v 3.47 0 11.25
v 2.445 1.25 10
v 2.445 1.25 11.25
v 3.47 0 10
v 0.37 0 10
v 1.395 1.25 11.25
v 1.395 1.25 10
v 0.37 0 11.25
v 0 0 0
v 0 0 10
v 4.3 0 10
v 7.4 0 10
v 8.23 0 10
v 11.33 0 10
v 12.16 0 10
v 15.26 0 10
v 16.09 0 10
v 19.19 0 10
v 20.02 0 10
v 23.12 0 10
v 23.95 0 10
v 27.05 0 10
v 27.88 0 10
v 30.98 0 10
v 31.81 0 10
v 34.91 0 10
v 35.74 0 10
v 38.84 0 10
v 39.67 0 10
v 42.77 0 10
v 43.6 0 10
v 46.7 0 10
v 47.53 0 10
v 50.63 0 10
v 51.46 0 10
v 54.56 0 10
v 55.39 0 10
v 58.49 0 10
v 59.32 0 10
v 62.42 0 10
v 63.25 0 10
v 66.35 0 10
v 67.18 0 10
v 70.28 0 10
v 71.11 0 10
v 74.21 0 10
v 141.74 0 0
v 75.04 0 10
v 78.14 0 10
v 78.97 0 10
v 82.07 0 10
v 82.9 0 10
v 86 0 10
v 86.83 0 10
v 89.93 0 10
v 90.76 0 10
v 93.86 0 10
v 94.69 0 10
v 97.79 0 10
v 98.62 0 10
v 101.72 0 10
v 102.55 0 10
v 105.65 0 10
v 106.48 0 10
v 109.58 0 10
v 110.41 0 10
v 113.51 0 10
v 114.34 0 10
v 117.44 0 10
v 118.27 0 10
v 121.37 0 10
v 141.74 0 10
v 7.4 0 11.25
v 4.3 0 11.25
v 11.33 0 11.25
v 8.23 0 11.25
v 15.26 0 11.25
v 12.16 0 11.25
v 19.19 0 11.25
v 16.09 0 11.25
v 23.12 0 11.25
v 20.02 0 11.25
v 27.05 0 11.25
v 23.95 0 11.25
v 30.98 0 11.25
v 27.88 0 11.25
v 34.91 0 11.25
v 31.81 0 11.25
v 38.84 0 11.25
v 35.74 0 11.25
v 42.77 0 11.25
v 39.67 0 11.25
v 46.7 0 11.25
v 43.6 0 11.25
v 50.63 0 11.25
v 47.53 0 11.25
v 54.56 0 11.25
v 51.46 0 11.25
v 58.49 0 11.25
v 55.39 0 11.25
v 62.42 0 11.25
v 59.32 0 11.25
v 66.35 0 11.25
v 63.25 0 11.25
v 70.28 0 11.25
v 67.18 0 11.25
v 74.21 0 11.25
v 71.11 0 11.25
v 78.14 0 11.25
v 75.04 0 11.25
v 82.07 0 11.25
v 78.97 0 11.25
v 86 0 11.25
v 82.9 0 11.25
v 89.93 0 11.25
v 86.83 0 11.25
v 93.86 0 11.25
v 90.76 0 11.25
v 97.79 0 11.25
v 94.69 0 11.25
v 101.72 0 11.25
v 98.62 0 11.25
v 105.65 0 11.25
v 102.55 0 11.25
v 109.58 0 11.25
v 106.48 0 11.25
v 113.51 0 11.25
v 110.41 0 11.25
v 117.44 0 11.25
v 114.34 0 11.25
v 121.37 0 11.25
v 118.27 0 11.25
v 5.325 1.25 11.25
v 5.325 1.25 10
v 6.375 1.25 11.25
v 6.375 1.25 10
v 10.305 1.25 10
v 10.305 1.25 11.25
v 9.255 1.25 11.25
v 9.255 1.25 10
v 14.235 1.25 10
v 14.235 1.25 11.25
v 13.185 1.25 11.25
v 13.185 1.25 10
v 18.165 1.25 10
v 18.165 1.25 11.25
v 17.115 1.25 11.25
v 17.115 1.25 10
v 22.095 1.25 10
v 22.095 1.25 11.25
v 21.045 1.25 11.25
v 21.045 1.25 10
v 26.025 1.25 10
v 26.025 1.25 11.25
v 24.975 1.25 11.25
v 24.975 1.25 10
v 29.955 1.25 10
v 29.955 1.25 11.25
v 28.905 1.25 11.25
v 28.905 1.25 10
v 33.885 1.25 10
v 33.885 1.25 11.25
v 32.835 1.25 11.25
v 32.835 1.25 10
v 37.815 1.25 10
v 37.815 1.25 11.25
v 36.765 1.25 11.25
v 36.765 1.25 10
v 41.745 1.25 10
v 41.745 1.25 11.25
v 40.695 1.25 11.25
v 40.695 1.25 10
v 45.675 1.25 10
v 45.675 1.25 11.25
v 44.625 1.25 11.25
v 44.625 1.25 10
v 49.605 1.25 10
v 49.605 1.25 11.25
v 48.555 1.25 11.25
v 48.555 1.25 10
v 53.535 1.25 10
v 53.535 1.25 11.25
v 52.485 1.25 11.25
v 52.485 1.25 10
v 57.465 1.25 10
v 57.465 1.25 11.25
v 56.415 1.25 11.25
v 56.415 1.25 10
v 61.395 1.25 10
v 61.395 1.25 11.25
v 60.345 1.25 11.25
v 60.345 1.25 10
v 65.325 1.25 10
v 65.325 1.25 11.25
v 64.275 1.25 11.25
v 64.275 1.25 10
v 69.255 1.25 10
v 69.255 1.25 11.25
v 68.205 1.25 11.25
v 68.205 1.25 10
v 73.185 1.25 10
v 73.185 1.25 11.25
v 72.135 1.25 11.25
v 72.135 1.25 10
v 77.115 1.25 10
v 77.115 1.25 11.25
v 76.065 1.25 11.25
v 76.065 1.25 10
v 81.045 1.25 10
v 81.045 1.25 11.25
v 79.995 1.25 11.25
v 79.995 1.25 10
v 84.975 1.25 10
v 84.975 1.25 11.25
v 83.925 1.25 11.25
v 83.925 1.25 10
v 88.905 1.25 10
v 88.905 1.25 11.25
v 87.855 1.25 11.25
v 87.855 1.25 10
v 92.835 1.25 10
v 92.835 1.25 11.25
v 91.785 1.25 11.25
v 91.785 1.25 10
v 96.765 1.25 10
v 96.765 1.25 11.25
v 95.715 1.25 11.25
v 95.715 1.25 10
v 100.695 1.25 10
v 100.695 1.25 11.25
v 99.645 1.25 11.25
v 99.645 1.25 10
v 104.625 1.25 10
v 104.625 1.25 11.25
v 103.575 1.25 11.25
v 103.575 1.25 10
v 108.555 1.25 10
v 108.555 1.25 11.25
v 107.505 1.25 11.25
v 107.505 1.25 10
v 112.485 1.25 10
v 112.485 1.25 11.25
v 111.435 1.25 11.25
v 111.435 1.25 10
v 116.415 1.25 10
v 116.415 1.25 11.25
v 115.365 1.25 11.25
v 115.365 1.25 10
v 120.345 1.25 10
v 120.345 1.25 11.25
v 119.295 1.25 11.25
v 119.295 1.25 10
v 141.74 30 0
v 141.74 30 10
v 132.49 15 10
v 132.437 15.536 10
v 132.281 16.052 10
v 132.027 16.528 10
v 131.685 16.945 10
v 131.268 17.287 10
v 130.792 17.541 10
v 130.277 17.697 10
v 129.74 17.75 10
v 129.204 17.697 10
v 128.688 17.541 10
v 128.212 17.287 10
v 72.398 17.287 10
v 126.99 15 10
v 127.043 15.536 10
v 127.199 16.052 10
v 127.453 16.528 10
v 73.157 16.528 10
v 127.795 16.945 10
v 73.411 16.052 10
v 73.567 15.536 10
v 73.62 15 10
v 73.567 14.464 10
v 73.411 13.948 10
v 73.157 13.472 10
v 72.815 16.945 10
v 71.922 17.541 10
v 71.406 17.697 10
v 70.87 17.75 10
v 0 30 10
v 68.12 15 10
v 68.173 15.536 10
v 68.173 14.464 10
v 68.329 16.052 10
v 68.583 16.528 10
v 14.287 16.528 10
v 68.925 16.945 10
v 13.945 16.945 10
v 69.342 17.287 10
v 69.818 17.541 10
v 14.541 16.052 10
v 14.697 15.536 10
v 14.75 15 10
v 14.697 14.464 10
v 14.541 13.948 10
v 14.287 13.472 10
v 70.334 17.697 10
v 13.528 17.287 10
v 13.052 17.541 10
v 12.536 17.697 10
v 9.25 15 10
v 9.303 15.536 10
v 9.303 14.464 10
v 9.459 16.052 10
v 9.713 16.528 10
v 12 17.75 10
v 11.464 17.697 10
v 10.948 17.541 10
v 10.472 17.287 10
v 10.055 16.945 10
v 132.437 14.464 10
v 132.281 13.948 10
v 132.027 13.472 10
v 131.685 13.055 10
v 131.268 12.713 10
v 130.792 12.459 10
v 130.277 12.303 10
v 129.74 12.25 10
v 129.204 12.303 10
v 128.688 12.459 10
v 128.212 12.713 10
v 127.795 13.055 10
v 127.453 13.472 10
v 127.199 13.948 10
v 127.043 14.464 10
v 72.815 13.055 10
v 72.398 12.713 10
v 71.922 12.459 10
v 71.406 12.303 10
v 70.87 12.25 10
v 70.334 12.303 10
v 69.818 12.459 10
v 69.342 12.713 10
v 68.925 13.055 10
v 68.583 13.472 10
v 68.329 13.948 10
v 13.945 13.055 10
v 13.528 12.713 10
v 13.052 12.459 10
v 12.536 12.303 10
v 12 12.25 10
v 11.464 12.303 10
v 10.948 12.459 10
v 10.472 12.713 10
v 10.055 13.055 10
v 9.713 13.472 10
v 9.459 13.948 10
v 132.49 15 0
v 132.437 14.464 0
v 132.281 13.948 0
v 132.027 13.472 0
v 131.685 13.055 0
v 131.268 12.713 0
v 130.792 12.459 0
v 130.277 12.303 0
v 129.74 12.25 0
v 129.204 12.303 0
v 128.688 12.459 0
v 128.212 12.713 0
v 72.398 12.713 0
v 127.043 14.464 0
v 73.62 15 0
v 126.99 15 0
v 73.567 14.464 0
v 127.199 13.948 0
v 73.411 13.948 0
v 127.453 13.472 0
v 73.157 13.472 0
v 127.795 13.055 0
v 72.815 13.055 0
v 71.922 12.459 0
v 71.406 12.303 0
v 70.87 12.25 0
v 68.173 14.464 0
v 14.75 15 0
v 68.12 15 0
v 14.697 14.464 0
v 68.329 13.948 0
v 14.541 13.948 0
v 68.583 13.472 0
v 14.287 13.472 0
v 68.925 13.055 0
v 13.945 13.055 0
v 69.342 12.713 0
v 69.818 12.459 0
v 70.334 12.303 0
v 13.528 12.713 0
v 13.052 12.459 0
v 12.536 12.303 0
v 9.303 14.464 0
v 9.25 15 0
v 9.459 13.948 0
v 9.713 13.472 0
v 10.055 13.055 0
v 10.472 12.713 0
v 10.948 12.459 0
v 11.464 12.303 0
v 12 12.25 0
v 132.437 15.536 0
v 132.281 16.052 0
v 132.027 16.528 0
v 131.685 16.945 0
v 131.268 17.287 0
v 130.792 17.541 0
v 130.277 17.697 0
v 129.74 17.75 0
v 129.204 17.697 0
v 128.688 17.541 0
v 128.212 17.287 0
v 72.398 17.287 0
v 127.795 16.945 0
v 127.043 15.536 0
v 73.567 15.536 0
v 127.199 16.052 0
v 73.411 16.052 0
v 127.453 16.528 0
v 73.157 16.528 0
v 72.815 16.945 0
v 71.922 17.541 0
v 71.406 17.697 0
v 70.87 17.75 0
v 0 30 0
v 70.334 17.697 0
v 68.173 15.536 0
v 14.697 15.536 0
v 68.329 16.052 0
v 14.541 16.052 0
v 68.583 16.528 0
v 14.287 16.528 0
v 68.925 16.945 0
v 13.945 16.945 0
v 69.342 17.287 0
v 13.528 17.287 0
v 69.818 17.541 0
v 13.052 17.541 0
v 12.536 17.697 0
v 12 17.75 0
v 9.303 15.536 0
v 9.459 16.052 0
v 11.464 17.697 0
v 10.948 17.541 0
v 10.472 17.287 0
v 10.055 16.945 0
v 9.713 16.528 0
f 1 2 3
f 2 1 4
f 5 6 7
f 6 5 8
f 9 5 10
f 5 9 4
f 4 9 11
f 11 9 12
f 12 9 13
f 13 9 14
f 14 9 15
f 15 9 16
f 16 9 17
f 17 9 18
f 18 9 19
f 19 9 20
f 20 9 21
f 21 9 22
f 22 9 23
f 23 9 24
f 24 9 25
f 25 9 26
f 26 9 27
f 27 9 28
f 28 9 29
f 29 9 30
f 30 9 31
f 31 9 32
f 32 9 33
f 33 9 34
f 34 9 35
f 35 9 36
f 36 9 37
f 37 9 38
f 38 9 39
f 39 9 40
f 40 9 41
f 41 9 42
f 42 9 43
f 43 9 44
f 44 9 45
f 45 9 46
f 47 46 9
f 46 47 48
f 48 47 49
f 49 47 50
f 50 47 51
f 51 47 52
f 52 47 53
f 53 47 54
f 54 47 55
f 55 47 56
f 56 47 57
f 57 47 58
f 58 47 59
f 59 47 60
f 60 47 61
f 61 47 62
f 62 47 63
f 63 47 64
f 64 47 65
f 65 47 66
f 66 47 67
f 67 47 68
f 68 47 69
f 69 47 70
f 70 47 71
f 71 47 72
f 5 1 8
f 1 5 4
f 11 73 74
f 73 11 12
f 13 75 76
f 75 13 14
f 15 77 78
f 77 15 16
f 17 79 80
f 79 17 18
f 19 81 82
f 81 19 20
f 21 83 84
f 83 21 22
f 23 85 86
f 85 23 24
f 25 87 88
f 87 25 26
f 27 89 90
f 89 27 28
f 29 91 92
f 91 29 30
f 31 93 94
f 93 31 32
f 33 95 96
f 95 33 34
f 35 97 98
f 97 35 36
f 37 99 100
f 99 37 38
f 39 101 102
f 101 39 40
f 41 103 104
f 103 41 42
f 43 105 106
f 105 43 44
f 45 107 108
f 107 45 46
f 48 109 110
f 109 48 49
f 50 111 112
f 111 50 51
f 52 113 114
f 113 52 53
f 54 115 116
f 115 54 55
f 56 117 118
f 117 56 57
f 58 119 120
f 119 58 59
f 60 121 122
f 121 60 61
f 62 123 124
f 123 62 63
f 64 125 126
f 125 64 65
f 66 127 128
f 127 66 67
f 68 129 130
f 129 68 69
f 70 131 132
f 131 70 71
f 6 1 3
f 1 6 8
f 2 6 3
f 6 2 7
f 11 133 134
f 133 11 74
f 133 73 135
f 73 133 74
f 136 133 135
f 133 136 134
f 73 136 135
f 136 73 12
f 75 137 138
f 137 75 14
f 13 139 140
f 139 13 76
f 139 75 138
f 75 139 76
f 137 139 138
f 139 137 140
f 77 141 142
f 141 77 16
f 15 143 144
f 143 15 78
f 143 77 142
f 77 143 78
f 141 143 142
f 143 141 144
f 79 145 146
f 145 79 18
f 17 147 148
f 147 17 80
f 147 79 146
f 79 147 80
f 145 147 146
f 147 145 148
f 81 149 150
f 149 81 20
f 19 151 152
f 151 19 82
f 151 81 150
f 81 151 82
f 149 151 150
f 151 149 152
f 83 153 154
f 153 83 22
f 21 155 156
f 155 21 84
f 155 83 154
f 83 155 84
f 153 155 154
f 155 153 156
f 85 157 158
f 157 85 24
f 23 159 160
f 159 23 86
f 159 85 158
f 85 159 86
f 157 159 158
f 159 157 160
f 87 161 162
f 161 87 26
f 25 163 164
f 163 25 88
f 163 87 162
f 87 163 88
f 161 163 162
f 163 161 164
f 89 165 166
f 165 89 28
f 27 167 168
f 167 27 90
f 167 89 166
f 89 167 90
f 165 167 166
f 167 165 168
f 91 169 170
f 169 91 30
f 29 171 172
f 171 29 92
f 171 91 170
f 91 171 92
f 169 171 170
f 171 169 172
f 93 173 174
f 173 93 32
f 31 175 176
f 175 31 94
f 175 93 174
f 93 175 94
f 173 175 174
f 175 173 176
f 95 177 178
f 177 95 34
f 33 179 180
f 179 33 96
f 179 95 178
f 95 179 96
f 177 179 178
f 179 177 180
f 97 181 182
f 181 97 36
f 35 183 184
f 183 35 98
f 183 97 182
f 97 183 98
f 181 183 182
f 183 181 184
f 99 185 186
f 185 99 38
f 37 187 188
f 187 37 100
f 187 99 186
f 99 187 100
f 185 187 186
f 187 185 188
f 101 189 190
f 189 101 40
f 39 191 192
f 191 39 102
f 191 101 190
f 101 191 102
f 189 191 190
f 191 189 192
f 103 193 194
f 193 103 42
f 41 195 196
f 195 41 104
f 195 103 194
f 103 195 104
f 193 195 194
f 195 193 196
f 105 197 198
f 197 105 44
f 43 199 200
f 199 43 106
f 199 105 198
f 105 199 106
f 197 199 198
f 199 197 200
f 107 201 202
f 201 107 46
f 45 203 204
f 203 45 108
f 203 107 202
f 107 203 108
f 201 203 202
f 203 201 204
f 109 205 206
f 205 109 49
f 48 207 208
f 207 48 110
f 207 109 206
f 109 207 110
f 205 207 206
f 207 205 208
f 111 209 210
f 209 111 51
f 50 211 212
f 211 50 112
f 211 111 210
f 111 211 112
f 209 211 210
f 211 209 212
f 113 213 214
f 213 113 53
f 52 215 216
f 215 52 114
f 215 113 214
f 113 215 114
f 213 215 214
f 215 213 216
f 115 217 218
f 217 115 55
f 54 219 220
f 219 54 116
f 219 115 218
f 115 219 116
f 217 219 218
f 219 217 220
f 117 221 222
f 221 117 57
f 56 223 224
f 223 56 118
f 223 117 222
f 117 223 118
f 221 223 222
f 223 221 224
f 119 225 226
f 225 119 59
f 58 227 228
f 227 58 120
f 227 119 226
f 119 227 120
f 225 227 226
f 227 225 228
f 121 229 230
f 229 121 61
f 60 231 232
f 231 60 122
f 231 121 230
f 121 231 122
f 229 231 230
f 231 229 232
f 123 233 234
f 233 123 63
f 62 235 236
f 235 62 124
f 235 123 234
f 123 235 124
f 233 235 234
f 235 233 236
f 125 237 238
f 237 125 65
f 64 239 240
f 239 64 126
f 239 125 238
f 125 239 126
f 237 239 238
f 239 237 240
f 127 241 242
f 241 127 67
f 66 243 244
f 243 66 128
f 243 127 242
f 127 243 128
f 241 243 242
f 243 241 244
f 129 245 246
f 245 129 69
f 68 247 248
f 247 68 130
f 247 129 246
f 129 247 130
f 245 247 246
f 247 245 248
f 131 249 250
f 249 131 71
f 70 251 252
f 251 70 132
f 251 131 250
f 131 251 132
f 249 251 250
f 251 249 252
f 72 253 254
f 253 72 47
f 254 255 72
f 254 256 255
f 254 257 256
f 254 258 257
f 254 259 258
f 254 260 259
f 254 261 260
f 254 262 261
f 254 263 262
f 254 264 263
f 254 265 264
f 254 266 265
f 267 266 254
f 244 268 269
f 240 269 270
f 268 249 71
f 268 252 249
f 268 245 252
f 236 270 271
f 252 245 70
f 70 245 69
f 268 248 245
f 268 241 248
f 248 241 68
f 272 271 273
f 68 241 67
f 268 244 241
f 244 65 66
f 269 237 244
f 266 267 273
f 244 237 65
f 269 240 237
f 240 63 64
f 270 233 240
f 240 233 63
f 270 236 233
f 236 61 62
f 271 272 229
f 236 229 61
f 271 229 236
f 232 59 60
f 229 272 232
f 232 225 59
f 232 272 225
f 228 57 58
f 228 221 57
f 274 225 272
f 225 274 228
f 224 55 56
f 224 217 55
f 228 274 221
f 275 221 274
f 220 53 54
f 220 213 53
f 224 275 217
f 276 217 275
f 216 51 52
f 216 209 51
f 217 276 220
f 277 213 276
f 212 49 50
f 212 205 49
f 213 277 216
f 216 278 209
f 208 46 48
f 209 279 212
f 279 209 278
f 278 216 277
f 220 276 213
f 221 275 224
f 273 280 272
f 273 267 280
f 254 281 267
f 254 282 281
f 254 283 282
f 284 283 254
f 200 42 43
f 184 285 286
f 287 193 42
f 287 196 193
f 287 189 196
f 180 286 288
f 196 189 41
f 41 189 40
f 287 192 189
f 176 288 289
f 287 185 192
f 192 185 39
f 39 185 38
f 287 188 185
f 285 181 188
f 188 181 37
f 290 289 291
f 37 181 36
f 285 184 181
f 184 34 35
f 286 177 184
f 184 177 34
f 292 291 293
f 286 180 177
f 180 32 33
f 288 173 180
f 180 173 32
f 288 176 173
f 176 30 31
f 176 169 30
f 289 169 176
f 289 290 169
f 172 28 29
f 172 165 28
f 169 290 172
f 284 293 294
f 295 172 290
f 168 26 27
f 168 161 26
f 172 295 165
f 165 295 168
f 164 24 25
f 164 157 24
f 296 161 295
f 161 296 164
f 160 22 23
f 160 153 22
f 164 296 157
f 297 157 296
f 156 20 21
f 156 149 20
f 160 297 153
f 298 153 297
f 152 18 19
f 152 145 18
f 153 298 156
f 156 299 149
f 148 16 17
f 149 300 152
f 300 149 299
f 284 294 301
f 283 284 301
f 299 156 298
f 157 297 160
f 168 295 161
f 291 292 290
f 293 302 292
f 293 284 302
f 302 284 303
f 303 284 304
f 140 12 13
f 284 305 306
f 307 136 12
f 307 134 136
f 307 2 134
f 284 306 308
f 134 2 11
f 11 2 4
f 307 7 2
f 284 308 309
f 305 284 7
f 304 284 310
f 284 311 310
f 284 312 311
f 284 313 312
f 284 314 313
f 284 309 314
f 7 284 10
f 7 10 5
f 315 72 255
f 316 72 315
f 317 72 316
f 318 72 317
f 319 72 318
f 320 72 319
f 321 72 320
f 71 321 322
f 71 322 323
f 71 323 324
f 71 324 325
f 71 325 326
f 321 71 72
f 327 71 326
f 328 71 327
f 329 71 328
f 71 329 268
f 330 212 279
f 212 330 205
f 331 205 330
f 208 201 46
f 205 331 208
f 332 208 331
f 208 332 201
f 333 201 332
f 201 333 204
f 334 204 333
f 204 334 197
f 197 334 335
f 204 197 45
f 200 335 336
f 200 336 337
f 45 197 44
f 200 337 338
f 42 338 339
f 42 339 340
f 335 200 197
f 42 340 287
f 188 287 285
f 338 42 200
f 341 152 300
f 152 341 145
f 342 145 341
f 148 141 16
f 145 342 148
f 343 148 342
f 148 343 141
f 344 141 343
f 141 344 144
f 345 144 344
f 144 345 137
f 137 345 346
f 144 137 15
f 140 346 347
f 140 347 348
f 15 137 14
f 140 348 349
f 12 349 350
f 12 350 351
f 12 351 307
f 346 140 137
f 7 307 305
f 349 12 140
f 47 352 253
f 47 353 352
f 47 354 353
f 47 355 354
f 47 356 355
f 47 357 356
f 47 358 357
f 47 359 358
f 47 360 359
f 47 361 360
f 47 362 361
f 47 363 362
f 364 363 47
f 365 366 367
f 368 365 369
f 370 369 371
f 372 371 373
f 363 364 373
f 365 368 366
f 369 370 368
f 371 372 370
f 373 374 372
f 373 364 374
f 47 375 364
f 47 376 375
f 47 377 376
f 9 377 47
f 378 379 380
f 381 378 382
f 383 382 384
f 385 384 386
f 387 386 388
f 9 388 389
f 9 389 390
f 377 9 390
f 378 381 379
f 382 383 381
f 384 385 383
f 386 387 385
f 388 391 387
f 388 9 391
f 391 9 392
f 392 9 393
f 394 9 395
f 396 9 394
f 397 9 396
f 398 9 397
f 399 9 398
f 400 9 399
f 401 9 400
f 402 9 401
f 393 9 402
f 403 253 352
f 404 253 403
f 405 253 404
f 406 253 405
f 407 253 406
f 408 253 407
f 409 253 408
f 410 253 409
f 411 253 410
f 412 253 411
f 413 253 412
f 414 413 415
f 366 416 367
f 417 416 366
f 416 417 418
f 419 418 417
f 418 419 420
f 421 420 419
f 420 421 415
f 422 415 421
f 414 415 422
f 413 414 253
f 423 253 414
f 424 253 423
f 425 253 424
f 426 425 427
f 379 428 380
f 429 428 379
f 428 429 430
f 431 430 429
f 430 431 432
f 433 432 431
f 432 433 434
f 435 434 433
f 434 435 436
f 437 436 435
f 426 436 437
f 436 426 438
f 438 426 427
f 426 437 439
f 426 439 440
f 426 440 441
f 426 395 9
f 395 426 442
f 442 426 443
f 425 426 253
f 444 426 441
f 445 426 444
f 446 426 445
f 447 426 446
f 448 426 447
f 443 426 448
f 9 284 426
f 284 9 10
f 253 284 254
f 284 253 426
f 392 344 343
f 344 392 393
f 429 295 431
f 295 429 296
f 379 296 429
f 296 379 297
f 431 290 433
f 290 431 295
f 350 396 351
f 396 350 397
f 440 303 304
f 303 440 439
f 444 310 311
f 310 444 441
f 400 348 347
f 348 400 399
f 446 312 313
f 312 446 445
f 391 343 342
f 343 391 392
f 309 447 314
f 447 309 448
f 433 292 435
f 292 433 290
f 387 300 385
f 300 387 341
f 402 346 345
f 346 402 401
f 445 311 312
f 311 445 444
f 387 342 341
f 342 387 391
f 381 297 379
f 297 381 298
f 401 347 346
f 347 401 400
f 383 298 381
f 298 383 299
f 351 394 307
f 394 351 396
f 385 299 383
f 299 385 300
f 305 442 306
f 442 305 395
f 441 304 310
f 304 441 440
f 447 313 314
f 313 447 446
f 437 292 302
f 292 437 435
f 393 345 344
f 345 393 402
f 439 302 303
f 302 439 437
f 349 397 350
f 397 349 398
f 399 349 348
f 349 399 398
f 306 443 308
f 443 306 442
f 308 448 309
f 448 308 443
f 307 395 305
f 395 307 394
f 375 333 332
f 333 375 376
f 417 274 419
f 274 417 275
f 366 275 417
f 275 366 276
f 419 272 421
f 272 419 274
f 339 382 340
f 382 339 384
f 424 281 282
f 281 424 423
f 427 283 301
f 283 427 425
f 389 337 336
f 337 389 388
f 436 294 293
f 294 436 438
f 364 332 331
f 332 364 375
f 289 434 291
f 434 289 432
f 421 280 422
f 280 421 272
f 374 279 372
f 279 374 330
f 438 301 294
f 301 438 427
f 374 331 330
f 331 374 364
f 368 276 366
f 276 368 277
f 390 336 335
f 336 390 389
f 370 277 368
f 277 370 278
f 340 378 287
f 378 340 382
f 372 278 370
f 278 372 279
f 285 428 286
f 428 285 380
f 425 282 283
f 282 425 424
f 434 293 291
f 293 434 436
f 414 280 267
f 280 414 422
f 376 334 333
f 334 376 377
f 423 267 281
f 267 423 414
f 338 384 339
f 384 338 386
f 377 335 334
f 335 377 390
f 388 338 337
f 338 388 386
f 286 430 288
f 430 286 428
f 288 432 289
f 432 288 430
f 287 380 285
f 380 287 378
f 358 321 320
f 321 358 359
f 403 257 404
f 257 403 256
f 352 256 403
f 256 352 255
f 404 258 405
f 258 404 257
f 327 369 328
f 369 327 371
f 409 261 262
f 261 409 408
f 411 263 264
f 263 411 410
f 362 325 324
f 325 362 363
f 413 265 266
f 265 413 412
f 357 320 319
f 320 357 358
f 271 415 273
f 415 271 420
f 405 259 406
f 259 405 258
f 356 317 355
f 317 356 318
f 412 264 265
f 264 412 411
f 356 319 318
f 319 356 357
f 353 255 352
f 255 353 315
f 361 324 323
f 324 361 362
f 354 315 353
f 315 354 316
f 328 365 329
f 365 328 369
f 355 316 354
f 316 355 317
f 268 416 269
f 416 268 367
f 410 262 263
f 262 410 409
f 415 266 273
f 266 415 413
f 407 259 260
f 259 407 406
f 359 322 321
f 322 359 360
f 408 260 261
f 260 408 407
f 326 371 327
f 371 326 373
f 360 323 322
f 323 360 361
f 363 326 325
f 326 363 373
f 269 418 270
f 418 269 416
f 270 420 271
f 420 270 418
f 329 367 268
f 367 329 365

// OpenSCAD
$fn = 32;

// ----------------------------------------------------------------------
// Gear rack: m=1.25 z=31, 141.74 x 30 x 11.25 mm
// ----------------------------------------------------------------------

// --- parameters (mm) ---
bar_len = 141.74;         // rack length, X
bar_w = 30;               // rack width, Y
bar_h = 11.25;            // overall height, Z
gear_module = 1.25;       // module
base_t = 10;              // tooth root line height
pitch = 3.93;             // circular pitch
tip_w = 1.05;             // tooth thickness at the tip
root_w = 3.1;             // tooth thickness at the root line
hole_d = 5.5;             // mounting hole
sink = 0.6;               // tooth root overlap into the body

tooth_span = 121.74;

module tooth(x0) {
  /* 20 deg flank profile, sunk into the body for a positive overlap */
  translate([x0, 0, base_t - sink])
    linear_extrude(height = bar_h - base_t + sink)
      polygon(points = [[-root_w / 2, 0], [root_w / 2, 0],
                        [tip_w / 2, bar_h - base_t],
                        [-tip_w / 2, bar_h - base_t]]);
}

difference() {
  union() {
    cube([bar_len, bar_w, base_t]);
    for (i = [0 : 31 - 1])
      tooth((i + 0.5) * pitch + (tooth_span - 31 * pitch) / 2);
  }
  translate([12, 15, -1]) cylinder(h = base_t + 2, d = hole_d);
  translate([70.87, 15, -1]) cylinder(h = base_t + 2, d = hole_d);
  translate([129.74, 15, -1]) cylinder(h = base_t + 2, d = hole_d);
}
